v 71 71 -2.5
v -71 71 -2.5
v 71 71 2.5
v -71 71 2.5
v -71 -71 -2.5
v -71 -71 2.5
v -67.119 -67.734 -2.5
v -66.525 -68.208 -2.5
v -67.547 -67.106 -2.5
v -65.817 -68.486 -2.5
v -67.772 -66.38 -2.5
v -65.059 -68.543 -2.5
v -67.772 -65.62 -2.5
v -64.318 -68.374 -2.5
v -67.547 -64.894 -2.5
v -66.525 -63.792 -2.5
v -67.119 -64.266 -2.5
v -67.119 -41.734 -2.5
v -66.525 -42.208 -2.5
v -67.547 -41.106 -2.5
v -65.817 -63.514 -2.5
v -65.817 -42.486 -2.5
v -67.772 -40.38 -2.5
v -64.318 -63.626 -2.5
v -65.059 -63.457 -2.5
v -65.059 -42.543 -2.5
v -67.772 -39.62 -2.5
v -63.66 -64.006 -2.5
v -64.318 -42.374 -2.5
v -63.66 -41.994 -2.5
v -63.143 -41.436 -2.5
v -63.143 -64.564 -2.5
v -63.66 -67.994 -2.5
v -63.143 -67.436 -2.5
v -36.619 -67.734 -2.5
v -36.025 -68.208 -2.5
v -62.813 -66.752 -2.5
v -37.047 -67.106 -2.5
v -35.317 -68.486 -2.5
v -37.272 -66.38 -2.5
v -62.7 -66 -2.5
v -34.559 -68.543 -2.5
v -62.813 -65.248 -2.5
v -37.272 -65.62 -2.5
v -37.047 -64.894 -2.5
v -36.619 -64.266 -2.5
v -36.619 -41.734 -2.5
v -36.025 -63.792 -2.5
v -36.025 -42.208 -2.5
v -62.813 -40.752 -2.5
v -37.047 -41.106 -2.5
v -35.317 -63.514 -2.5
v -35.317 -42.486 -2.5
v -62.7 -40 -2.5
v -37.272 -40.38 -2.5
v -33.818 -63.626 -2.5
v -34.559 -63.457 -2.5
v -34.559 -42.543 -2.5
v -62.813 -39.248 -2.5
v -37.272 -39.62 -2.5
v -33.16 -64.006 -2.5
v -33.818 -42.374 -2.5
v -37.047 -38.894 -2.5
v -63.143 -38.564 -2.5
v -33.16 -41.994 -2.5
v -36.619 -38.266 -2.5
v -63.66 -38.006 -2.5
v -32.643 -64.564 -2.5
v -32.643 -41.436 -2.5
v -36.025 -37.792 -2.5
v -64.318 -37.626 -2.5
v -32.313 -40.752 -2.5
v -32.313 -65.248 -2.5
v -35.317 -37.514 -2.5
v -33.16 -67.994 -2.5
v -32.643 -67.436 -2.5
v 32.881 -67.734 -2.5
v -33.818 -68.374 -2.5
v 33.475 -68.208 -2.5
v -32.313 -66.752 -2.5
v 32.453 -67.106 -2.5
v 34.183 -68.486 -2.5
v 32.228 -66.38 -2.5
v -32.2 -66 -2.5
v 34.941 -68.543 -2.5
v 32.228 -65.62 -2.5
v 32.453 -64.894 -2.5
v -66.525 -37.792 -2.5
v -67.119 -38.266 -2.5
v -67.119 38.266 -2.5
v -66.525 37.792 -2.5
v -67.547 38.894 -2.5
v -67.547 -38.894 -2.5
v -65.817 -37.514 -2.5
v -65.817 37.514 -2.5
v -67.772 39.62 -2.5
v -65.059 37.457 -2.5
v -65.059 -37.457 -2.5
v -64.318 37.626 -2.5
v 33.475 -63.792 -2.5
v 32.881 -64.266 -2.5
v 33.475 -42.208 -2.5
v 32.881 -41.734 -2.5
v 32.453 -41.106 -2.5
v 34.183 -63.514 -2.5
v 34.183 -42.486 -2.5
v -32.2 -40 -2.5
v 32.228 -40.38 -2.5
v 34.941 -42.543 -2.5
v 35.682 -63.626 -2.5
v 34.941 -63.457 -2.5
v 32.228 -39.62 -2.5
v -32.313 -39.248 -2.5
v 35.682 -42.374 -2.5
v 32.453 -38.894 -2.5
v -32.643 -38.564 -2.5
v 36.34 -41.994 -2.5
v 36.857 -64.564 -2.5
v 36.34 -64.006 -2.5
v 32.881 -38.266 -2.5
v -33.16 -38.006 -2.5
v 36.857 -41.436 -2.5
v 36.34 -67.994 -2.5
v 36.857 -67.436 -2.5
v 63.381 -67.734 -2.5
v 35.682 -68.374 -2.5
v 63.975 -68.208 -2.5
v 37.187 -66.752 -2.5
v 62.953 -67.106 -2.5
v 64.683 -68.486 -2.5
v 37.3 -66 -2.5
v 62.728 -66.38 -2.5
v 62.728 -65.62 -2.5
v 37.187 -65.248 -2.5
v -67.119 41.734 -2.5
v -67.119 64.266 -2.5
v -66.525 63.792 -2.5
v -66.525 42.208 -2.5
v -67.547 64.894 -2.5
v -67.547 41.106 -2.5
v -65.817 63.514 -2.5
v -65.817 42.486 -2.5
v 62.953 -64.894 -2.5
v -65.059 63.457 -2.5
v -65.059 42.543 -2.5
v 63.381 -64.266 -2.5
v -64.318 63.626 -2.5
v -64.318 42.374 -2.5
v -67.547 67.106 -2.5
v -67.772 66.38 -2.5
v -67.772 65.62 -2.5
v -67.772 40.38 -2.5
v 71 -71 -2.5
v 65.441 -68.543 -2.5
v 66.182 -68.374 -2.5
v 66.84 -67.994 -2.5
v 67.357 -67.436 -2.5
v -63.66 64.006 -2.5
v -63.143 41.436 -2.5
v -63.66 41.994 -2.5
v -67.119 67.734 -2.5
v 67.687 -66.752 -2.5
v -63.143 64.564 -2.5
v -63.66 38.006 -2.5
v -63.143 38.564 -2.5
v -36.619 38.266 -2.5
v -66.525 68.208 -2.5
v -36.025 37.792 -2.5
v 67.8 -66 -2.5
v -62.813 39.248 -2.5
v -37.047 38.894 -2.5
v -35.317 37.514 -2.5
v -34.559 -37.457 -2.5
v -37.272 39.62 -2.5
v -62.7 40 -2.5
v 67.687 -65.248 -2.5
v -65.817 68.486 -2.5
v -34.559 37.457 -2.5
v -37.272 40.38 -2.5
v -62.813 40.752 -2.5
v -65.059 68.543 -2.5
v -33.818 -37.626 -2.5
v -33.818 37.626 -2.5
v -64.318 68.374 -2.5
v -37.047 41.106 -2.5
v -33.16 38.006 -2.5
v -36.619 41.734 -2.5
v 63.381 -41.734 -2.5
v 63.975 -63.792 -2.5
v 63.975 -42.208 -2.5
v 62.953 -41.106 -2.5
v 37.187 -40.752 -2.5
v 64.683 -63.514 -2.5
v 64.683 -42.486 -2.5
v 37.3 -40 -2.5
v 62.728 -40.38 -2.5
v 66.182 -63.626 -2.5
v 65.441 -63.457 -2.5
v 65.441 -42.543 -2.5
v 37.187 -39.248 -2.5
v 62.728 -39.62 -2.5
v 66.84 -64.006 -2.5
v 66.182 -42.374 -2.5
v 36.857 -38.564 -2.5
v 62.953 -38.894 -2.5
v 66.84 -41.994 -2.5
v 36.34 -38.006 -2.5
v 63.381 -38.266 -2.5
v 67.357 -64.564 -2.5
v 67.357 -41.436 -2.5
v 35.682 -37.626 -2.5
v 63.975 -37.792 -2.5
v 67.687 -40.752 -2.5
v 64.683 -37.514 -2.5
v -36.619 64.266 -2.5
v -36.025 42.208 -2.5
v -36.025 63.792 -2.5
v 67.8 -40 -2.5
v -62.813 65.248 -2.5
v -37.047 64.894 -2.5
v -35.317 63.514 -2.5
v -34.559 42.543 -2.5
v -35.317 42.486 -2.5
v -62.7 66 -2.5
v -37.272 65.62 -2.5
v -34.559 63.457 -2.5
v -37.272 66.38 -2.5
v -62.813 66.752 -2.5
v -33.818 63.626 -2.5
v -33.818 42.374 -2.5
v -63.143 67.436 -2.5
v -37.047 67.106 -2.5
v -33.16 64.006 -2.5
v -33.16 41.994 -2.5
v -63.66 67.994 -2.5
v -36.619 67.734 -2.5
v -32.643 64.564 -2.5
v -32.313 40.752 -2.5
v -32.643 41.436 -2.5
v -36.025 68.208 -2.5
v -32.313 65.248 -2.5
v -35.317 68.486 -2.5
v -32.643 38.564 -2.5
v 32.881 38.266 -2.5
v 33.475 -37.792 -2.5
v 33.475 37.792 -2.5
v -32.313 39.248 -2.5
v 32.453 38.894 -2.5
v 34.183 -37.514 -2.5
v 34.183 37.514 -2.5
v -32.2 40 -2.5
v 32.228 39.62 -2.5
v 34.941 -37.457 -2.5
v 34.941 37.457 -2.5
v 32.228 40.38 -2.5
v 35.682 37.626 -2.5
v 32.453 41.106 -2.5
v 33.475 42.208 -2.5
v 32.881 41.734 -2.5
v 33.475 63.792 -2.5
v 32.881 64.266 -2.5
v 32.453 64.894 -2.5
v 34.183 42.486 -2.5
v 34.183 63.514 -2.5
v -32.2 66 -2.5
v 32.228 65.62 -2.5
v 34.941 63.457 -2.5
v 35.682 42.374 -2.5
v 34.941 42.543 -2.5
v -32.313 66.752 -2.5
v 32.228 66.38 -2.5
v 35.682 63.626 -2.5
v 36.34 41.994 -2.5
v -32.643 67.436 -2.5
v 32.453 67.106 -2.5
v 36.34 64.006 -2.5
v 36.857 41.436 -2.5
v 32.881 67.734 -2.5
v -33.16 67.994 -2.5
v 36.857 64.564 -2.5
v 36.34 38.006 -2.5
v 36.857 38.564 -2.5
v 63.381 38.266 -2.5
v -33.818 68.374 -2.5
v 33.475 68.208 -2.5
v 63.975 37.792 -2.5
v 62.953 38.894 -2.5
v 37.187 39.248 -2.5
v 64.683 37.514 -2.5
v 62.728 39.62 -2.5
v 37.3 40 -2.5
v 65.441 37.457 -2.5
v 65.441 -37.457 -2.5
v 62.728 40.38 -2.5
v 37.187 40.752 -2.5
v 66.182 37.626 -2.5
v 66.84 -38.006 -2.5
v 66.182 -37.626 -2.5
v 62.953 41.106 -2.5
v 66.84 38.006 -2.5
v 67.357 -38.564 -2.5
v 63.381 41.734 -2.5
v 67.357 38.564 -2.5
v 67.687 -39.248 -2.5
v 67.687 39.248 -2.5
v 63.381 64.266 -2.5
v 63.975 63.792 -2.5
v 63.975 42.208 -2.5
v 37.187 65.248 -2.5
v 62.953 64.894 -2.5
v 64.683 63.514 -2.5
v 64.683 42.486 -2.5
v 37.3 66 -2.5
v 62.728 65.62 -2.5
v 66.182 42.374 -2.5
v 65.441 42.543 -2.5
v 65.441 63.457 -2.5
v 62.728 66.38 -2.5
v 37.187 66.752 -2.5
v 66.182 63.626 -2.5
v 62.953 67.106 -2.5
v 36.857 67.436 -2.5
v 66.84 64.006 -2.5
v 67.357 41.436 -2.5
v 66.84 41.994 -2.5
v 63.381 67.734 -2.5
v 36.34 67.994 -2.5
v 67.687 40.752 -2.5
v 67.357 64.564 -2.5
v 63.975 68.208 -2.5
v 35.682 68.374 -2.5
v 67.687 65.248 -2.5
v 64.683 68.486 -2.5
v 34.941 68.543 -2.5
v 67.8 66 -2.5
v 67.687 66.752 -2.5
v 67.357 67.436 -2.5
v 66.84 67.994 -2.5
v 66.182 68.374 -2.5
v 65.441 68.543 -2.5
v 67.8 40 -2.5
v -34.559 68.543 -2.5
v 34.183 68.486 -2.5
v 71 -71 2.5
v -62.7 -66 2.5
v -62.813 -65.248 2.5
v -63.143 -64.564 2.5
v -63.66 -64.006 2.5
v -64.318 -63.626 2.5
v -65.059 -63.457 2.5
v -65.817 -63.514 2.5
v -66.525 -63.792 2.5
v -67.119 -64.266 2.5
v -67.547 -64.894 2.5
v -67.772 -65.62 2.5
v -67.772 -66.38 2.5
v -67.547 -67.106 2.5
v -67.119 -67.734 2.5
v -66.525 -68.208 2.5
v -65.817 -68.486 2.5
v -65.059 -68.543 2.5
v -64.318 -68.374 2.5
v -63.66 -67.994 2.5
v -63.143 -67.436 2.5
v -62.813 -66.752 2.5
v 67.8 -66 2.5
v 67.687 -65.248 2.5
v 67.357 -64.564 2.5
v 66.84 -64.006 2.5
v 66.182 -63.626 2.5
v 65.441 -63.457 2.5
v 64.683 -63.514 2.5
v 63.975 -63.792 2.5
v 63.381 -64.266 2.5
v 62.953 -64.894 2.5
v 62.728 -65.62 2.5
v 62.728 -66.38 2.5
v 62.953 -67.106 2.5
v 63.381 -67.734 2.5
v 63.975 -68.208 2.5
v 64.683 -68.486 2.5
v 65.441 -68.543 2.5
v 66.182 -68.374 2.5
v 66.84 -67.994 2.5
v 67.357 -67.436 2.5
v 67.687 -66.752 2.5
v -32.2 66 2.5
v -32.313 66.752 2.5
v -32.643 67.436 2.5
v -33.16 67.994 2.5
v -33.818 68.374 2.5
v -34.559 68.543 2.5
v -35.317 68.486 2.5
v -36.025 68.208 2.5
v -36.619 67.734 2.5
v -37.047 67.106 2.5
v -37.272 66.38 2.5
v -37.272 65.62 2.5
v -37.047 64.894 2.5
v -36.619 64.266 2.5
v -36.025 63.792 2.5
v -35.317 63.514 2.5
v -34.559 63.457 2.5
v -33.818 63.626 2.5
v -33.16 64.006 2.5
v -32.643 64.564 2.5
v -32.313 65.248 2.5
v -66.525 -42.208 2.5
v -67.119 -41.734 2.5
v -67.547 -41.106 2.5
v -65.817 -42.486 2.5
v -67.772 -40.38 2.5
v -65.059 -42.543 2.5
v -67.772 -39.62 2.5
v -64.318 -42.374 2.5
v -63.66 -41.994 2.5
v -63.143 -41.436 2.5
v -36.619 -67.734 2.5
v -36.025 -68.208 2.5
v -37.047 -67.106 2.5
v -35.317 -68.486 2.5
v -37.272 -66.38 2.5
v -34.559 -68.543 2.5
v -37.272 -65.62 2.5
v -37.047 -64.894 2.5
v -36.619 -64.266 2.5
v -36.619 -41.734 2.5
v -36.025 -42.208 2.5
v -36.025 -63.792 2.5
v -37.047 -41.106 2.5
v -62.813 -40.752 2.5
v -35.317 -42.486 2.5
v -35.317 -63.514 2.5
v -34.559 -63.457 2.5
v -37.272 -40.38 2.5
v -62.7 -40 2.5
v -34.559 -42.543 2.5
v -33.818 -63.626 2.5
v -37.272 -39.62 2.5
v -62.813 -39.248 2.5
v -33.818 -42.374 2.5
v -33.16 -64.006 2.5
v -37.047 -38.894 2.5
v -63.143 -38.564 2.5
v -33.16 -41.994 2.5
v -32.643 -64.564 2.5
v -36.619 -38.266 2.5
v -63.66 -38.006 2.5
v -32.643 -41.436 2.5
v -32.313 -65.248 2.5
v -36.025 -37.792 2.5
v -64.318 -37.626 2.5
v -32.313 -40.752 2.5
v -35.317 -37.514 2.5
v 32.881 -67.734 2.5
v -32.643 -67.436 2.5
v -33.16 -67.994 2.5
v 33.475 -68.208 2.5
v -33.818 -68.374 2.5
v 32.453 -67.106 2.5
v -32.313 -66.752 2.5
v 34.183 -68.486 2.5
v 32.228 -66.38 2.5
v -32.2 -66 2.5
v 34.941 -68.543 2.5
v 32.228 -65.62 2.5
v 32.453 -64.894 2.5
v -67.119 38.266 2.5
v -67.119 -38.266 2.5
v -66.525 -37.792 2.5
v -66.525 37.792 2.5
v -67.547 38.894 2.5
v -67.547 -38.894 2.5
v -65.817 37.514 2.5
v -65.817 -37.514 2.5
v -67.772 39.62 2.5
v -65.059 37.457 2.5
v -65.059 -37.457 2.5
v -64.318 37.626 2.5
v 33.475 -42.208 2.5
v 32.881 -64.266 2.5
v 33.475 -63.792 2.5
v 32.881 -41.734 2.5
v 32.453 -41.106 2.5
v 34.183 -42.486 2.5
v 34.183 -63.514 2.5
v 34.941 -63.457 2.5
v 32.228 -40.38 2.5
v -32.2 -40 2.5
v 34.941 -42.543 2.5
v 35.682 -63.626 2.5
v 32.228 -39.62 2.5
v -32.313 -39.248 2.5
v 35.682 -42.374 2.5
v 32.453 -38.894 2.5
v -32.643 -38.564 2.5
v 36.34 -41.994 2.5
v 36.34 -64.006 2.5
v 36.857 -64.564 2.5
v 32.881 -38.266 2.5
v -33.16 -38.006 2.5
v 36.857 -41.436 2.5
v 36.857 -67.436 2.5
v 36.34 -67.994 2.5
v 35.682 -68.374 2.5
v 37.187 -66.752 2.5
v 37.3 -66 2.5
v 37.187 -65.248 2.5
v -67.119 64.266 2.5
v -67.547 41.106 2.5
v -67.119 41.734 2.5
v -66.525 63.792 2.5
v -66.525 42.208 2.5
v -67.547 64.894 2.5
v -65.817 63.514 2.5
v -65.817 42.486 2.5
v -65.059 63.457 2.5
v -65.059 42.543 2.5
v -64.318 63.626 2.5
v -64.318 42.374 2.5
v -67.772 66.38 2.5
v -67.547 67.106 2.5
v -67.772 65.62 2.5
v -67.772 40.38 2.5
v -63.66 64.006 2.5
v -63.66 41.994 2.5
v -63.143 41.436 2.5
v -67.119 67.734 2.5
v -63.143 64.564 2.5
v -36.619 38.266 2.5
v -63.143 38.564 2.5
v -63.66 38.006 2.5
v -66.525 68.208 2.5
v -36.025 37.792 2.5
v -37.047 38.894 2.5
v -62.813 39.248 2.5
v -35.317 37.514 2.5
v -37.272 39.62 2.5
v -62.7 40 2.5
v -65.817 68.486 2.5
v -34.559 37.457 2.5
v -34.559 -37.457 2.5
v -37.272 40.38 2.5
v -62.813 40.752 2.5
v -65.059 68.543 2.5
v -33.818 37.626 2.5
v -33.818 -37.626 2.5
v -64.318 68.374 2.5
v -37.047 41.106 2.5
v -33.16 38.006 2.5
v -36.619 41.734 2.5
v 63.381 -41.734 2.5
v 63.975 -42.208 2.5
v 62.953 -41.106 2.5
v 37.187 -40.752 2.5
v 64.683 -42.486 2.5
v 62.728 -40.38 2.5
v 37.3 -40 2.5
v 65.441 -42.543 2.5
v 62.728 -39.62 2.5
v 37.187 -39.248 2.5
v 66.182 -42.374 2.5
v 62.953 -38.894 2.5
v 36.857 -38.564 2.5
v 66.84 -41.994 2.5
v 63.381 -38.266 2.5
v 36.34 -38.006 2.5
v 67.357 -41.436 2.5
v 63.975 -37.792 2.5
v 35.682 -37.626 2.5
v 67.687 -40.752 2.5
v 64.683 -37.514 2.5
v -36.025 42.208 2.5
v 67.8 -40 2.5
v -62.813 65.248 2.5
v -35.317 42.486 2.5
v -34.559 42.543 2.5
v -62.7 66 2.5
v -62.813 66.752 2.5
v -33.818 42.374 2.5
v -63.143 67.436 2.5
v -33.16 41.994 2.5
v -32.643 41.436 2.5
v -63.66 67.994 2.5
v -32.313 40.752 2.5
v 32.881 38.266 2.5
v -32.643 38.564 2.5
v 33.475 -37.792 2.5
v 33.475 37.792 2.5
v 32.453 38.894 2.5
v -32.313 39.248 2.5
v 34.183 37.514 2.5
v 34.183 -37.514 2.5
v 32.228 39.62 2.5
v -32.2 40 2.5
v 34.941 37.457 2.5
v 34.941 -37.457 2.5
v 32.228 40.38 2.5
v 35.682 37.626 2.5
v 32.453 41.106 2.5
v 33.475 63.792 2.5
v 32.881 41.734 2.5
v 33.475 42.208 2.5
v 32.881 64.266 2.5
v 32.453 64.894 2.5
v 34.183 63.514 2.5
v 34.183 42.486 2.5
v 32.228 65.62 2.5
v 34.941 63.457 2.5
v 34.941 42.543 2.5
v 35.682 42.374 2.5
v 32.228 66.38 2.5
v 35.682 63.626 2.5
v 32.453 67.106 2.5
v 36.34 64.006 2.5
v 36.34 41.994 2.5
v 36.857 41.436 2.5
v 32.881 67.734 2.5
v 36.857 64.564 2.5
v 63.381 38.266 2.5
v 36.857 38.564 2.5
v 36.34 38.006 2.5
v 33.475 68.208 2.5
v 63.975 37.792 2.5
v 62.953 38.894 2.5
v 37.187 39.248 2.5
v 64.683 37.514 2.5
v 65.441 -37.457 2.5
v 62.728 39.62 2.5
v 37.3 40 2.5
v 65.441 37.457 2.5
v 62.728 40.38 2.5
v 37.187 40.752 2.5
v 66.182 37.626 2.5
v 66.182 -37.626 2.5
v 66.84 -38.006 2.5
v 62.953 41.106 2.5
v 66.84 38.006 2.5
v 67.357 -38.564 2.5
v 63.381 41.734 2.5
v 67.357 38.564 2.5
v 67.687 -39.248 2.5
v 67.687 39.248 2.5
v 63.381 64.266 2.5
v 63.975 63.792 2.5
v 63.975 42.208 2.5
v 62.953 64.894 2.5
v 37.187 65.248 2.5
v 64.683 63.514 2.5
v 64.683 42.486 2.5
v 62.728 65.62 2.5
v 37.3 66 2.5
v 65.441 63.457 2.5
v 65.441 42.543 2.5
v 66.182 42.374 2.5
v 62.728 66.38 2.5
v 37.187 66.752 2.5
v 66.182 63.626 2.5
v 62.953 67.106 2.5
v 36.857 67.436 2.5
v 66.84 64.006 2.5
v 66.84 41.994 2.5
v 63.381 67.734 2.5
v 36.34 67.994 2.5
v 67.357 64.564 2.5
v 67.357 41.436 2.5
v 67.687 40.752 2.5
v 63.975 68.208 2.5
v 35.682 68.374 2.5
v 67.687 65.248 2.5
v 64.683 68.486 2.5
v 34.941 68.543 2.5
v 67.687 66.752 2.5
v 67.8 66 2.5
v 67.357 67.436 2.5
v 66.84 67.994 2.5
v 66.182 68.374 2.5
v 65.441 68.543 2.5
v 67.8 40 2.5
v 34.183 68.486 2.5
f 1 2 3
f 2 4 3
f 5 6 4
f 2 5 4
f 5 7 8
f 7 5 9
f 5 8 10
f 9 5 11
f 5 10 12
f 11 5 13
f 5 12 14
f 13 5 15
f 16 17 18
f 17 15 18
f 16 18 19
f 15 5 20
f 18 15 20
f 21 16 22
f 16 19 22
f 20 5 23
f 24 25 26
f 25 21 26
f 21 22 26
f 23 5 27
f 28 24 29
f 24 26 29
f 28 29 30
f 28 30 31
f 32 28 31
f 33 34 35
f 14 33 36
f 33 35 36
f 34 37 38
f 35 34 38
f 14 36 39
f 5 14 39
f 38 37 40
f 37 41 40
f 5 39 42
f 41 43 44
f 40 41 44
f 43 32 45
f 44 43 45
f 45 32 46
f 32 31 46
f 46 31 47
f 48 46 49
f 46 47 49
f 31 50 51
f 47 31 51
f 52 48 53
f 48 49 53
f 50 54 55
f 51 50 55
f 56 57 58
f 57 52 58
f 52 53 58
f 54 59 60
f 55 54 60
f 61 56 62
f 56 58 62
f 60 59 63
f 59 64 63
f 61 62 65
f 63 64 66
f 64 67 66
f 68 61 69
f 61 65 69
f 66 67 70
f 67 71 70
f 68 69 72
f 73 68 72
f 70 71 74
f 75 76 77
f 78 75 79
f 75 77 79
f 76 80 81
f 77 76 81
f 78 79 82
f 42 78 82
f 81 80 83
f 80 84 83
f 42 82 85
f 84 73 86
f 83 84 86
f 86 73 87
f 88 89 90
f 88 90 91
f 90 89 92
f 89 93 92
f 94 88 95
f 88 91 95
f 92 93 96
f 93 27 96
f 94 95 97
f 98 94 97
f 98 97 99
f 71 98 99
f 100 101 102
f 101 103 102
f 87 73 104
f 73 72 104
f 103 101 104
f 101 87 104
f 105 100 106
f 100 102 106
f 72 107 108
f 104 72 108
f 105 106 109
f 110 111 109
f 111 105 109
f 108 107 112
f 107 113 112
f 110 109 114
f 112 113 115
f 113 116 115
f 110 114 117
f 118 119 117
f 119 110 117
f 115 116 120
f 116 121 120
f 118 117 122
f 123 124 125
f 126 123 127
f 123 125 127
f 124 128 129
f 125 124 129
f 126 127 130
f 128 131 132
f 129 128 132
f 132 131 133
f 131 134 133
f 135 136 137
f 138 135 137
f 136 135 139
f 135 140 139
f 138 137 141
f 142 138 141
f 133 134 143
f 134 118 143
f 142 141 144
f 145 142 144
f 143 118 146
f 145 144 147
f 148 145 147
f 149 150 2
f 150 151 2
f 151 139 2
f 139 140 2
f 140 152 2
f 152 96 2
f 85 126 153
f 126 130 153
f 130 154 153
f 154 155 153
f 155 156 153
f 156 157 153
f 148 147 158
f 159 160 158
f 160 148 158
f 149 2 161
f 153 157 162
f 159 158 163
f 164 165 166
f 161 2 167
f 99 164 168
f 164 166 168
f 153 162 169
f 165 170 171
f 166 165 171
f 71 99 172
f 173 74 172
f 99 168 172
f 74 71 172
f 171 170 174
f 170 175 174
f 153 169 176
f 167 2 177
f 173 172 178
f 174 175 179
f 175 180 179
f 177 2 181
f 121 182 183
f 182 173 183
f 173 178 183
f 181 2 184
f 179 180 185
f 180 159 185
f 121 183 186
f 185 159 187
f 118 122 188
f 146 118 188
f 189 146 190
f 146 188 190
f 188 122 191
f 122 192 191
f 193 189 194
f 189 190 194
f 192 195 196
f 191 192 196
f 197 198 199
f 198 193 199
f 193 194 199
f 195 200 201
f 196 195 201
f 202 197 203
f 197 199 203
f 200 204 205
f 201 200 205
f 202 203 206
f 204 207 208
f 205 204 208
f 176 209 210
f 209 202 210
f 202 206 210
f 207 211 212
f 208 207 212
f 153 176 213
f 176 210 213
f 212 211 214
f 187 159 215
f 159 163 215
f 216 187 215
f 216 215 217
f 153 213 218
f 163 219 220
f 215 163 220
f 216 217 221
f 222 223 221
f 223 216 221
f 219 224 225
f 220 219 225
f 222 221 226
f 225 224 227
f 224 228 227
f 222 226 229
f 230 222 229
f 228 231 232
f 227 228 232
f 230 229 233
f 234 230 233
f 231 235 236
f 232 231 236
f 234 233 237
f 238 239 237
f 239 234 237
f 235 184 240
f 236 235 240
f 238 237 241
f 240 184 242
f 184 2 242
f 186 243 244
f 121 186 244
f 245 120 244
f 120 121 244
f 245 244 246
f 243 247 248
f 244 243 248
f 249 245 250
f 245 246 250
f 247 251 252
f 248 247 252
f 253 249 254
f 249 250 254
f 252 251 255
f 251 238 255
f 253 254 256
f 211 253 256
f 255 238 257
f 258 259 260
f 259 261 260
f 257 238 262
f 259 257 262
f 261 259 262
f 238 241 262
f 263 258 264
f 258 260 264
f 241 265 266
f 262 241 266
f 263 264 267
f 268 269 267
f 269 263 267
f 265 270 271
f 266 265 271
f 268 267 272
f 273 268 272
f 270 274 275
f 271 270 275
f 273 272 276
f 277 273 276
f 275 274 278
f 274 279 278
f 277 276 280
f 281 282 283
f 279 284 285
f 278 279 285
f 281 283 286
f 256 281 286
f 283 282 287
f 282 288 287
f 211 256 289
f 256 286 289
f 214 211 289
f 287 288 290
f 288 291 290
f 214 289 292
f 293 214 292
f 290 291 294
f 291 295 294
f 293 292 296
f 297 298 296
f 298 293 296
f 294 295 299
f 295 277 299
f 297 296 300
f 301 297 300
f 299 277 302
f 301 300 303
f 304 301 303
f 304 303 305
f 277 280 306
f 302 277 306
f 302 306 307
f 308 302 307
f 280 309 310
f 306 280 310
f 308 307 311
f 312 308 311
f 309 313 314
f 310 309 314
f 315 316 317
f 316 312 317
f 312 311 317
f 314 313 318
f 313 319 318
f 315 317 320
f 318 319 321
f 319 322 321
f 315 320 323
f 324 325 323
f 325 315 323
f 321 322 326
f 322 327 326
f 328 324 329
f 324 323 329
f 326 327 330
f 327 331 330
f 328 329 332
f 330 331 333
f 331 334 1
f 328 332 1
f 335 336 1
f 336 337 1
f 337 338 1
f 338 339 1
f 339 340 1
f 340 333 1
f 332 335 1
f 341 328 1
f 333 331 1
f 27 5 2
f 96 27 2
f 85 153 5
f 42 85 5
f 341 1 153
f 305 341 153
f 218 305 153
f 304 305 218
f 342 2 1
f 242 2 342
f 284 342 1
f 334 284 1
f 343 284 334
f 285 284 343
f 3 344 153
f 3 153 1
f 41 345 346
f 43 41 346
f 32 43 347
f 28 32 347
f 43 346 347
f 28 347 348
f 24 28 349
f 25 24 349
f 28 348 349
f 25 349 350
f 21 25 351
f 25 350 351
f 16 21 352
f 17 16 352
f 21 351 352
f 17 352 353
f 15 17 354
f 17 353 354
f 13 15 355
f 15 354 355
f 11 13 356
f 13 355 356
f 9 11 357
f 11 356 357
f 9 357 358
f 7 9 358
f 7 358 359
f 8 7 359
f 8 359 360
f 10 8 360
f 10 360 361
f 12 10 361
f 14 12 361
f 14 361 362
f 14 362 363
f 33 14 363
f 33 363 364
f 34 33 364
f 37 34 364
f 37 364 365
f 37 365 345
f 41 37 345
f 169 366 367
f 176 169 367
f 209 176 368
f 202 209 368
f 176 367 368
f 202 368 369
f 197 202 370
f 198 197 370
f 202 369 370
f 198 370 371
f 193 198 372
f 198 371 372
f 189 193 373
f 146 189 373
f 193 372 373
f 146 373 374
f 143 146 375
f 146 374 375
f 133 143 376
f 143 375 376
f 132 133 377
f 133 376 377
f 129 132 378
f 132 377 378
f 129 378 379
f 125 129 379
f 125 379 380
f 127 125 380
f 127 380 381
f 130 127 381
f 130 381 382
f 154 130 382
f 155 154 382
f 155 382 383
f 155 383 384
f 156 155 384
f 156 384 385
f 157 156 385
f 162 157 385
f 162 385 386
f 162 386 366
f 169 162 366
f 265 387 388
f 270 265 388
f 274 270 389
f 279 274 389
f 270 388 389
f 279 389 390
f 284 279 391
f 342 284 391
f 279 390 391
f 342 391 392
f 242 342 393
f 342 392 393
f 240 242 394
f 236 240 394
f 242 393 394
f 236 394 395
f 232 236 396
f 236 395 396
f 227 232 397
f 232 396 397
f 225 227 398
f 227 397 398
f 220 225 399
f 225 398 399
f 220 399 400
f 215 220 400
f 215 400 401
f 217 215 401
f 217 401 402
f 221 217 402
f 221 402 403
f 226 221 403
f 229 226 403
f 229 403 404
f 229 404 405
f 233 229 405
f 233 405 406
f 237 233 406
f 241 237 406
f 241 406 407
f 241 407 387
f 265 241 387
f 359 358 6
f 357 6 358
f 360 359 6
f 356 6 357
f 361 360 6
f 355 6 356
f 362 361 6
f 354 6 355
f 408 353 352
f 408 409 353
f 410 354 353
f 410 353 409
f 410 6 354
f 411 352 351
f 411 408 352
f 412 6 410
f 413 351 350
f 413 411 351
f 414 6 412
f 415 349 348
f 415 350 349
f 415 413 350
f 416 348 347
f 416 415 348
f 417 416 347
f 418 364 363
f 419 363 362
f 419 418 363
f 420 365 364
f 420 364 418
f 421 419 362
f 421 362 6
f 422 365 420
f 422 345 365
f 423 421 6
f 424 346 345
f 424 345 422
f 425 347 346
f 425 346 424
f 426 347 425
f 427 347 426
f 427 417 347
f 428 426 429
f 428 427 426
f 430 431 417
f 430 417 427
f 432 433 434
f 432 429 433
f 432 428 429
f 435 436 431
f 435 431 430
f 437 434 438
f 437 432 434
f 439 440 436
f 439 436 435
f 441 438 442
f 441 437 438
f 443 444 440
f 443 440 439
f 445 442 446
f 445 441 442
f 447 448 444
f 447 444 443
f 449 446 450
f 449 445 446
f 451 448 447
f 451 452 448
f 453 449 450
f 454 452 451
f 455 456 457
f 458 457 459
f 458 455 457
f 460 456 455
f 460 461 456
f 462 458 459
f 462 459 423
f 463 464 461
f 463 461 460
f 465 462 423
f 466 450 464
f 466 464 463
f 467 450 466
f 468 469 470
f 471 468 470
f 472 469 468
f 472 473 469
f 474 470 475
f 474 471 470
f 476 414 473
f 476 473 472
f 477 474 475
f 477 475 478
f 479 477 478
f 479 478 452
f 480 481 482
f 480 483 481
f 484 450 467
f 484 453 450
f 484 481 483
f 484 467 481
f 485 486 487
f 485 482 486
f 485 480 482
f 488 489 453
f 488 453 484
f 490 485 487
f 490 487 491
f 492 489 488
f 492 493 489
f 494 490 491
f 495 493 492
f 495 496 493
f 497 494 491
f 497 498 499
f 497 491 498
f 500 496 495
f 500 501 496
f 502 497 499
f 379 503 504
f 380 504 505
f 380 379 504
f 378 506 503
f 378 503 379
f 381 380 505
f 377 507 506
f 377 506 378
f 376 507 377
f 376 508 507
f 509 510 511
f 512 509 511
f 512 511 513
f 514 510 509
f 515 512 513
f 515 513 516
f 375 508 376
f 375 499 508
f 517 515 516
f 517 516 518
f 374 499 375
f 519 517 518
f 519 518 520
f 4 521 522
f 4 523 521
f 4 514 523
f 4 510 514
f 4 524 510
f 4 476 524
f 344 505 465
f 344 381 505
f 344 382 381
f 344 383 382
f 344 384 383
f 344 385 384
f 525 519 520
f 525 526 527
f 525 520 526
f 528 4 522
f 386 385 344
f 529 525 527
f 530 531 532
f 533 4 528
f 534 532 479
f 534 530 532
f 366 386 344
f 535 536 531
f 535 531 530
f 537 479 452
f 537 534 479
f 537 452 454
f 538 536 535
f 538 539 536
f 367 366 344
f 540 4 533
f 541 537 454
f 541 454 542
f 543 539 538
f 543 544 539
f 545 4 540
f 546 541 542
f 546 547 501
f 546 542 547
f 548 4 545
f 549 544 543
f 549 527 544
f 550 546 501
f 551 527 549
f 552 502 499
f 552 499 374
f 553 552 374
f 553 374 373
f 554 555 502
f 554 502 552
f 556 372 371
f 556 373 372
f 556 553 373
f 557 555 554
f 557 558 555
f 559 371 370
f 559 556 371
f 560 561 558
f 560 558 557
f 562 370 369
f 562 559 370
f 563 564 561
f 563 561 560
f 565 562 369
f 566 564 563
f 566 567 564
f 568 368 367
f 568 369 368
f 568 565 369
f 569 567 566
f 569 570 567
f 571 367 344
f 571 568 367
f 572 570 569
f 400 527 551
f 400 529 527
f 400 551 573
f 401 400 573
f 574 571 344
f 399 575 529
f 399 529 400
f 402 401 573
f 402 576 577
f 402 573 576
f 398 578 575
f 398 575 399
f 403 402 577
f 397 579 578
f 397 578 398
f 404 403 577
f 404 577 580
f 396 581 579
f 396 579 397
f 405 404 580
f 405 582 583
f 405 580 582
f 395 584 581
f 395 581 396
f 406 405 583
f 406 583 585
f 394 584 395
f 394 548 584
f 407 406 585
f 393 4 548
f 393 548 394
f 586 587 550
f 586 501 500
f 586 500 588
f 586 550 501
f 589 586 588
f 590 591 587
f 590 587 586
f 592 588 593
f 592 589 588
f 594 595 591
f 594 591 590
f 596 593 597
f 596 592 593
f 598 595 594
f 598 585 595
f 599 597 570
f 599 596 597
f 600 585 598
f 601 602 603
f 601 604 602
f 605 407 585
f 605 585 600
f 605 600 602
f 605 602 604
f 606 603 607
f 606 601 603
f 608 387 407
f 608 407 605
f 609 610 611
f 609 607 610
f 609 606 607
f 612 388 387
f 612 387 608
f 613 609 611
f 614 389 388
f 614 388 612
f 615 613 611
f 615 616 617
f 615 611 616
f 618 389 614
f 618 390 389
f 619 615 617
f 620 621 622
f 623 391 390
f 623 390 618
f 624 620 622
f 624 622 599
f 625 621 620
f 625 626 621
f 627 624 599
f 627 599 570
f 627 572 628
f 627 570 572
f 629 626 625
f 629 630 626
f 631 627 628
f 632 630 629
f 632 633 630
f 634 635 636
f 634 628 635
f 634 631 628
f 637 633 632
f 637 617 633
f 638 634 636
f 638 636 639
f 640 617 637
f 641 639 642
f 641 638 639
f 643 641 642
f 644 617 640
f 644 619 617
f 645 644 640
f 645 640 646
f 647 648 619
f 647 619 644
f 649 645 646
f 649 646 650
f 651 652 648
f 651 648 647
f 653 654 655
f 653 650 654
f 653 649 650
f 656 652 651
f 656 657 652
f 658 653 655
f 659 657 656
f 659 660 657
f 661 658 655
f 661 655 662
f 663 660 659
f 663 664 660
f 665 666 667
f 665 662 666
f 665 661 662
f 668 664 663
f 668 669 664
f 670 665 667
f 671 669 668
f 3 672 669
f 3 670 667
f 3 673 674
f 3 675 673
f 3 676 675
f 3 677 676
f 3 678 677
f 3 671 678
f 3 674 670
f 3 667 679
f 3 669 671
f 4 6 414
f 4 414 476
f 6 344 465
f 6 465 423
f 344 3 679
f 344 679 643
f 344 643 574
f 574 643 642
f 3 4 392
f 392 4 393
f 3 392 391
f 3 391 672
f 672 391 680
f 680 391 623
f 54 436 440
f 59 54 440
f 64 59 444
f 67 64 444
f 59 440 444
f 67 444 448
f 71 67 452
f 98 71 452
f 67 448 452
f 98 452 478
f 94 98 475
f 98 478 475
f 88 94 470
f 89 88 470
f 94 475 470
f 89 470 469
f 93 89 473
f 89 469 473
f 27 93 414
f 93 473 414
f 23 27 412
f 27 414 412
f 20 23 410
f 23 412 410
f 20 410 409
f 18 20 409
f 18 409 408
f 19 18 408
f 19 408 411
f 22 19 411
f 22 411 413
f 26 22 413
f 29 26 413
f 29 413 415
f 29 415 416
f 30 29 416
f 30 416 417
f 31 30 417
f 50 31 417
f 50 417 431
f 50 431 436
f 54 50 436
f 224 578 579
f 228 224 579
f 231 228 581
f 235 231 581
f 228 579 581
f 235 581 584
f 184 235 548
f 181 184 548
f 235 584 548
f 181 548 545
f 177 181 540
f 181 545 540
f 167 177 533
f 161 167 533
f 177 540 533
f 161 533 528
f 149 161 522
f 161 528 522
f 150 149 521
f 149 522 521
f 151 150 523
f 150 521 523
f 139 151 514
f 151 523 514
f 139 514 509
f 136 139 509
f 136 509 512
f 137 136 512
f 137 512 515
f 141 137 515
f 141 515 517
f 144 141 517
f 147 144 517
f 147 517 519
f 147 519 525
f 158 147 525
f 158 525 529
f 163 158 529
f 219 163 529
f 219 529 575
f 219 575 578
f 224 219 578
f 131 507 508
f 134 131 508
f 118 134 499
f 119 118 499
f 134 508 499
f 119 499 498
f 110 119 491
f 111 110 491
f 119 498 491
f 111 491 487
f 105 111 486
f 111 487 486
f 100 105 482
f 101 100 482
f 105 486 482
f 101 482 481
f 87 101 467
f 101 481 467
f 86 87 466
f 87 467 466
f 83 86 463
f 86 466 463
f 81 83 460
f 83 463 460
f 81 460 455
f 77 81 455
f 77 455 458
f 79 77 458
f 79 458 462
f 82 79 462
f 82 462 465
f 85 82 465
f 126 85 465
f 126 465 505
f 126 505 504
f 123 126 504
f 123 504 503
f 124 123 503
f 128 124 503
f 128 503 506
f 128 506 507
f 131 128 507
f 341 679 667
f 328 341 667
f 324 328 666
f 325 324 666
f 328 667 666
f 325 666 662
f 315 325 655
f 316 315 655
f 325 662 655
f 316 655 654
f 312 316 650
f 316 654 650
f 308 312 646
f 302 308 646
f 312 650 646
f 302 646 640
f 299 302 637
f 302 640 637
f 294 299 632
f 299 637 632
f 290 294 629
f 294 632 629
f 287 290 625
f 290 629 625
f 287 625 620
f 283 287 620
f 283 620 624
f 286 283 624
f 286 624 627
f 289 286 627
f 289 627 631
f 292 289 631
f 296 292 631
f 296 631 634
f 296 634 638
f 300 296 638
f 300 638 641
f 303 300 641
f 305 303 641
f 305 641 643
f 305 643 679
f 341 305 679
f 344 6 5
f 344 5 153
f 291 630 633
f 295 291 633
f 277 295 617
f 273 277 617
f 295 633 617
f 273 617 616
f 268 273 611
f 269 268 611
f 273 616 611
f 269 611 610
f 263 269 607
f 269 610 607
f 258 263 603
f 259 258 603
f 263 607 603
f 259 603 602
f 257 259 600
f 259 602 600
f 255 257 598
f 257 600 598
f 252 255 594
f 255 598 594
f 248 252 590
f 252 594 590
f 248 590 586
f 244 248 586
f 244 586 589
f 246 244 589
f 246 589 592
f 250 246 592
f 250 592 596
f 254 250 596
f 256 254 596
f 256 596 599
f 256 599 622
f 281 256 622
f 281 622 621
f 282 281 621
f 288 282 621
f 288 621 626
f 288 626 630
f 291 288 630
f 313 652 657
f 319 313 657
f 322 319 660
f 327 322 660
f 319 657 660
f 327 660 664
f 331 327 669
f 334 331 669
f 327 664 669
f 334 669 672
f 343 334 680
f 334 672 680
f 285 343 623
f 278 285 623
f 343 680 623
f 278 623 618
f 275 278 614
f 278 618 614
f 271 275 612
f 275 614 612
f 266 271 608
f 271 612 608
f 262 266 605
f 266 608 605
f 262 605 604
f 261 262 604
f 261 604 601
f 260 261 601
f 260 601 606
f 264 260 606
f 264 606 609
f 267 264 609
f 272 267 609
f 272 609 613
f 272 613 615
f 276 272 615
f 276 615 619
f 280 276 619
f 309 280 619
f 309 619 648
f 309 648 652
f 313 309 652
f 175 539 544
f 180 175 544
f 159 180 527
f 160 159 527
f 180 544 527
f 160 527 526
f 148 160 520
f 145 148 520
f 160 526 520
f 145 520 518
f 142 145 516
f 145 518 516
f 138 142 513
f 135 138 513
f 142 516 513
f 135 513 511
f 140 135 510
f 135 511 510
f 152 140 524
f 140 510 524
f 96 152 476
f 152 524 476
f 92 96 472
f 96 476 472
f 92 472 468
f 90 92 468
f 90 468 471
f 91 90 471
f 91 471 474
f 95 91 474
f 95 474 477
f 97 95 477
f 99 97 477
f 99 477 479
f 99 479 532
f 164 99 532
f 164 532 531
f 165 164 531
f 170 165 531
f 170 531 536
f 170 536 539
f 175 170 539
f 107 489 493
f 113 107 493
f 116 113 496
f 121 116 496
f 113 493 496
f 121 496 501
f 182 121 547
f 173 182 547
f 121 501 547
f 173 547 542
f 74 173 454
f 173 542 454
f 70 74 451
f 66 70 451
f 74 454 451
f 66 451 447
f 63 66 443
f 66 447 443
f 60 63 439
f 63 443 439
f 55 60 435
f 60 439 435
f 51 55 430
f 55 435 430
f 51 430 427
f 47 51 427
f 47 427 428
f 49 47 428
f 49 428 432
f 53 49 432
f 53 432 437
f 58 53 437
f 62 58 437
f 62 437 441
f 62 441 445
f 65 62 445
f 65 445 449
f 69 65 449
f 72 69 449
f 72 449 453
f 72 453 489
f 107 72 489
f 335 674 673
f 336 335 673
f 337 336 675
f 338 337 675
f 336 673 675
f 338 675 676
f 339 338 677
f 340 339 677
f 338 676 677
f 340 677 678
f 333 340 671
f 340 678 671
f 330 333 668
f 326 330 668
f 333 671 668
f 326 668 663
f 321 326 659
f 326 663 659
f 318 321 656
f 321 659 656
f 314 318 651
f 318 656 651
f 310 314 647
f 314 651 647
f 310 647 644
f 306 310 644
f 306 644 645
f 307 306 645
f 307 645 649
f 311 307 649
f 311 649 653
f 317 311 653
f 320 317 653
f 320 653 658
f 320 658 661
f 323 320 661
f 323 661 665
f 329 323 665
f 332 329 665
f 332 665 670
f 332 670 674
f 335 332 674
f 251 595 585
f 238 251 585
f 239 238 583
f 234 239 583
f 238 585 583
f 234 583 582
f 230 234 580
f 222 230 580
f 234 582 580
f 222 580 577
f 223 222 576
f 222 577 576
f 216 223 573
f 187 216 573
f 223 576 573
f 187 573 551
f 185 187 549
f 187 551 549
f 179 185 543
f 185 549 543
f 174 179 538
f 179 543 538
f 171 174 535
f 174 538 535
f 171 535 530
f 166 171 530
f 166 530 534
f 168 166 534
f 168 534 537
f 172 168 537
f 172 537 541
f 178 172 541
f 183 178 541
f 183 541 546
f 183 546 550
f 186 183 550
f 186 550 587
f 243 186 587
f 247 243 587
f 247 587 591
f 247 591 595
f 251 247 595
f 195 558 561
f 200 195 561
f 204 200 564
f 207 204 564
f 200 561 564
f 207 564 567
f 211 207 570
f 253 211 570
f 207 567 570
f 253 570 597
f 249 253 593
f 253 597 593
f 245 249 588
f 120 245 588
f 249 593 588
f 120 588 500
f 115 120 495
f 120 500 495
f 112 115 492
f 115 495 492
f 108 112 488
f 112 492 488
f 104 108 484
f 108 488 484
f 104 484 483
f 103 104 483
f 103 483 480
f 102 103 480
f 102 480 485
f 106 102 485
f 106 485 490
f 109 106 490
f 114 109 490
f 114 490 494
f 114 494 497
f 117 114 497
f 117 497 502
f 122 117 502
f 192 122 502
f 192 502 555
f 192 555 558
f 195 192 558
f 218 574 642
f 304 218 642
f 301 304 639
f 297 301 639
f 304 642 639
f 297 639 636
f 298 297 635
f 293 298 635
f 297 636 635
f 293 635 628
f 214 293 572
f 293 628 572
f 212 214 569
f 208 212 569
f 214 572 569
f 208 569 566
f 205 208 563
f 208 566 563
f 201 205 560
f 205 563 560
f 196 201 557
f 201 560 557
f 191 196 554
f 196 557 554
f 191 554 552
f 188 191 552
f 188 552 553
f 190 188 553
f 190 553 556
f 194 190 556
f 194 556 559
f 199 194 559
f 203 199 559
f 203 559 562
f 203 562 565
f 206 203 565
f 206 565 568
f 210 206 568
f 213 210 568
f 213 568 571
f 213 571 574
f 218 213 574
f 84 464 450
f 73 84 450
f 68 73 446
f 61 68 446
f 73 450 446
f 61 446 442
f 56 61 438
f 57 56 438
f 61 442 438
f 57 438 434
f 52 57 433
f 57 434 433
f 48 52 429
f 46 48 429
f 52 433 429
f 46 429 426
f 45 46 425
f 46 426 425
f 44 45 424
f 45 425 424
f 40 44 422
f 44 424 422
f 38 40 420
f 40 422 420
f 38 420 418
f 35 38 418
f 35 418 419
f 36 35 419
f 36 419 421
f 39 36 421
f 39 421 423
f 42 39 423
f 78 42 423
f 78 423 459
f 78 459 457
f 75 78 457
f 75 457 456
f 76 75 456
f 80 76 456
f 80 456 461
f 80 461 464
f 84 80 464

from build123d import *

# Parameters (mm, degrees)
SKETCH1_W           = 142
SKETCH1_H           = 142
BOSS_EXTRUDE1_DEPTH = 2.5
SKETCH2_R           = 2.55
CUT_EXTRUDE1_DEPTH  = 6


with BuildPart() as part:
    # Sketch1 → Boss-Extrude1 (new body, symmetric)
    with BuildSketch(Plane.XY):
        Rectangle(SKETCH1_W, SKETCH1_H)
    extrude(amount=BOSS_EXTRUDE1_DEPTH, both=True)

    # Sketch2 → Cut-Extrude1 (cut, through all)
    with BuildSketch(Plane.XY.offset(2.5)):
        with Locations((-65.25, 66)):
            Circle(SKETCH2_R)
        with Locations((-34.75, 66)):
            Circle(SKETCH2_R)
        with Locations((-34.75, 40)):
            Circle(SKETCH2_R)
        with Locations((-65.25, 40)):
            Circle(SKETCH2_R)
        with Locations((65.25, 66)):
            Circle(SKETCH2_R)
        with Locations((65.25, 40)):
            Circle(SKETCH2_R)
        with Locations((34.75, 40)):
            Circle(SKETCH2_R)
        with Locations((34.75, 66)):
            Circle(SKETCH2_R)
        with Locations((-65.25, -40)):
            Circle(SKETCH2_R)
        with Locations((-34.75, -40)):
            Circle(SKETCH2_R)
        with Locations((-34.75, -66)):
            Circle(SKETCH2_R)
        with Locations((-65.25, -66)):
            Circle(SKETCH2_R)
        with Locations((34.75, -40)):
            Circle(SKETCH2_R)
        with Locations((65.25, -40)):
            Circle(SKETCH2_R)
        with Locations((65.25, -66)):
            Circle(SKETCH2_R)
        with Locations((34.75, -66)):
            Circle(SKETCH2_R)
    extrude(amount=-CUT_EXTRUDE1_DEPTH, mode=Mode.SUBTRACT)


solid = part.part
